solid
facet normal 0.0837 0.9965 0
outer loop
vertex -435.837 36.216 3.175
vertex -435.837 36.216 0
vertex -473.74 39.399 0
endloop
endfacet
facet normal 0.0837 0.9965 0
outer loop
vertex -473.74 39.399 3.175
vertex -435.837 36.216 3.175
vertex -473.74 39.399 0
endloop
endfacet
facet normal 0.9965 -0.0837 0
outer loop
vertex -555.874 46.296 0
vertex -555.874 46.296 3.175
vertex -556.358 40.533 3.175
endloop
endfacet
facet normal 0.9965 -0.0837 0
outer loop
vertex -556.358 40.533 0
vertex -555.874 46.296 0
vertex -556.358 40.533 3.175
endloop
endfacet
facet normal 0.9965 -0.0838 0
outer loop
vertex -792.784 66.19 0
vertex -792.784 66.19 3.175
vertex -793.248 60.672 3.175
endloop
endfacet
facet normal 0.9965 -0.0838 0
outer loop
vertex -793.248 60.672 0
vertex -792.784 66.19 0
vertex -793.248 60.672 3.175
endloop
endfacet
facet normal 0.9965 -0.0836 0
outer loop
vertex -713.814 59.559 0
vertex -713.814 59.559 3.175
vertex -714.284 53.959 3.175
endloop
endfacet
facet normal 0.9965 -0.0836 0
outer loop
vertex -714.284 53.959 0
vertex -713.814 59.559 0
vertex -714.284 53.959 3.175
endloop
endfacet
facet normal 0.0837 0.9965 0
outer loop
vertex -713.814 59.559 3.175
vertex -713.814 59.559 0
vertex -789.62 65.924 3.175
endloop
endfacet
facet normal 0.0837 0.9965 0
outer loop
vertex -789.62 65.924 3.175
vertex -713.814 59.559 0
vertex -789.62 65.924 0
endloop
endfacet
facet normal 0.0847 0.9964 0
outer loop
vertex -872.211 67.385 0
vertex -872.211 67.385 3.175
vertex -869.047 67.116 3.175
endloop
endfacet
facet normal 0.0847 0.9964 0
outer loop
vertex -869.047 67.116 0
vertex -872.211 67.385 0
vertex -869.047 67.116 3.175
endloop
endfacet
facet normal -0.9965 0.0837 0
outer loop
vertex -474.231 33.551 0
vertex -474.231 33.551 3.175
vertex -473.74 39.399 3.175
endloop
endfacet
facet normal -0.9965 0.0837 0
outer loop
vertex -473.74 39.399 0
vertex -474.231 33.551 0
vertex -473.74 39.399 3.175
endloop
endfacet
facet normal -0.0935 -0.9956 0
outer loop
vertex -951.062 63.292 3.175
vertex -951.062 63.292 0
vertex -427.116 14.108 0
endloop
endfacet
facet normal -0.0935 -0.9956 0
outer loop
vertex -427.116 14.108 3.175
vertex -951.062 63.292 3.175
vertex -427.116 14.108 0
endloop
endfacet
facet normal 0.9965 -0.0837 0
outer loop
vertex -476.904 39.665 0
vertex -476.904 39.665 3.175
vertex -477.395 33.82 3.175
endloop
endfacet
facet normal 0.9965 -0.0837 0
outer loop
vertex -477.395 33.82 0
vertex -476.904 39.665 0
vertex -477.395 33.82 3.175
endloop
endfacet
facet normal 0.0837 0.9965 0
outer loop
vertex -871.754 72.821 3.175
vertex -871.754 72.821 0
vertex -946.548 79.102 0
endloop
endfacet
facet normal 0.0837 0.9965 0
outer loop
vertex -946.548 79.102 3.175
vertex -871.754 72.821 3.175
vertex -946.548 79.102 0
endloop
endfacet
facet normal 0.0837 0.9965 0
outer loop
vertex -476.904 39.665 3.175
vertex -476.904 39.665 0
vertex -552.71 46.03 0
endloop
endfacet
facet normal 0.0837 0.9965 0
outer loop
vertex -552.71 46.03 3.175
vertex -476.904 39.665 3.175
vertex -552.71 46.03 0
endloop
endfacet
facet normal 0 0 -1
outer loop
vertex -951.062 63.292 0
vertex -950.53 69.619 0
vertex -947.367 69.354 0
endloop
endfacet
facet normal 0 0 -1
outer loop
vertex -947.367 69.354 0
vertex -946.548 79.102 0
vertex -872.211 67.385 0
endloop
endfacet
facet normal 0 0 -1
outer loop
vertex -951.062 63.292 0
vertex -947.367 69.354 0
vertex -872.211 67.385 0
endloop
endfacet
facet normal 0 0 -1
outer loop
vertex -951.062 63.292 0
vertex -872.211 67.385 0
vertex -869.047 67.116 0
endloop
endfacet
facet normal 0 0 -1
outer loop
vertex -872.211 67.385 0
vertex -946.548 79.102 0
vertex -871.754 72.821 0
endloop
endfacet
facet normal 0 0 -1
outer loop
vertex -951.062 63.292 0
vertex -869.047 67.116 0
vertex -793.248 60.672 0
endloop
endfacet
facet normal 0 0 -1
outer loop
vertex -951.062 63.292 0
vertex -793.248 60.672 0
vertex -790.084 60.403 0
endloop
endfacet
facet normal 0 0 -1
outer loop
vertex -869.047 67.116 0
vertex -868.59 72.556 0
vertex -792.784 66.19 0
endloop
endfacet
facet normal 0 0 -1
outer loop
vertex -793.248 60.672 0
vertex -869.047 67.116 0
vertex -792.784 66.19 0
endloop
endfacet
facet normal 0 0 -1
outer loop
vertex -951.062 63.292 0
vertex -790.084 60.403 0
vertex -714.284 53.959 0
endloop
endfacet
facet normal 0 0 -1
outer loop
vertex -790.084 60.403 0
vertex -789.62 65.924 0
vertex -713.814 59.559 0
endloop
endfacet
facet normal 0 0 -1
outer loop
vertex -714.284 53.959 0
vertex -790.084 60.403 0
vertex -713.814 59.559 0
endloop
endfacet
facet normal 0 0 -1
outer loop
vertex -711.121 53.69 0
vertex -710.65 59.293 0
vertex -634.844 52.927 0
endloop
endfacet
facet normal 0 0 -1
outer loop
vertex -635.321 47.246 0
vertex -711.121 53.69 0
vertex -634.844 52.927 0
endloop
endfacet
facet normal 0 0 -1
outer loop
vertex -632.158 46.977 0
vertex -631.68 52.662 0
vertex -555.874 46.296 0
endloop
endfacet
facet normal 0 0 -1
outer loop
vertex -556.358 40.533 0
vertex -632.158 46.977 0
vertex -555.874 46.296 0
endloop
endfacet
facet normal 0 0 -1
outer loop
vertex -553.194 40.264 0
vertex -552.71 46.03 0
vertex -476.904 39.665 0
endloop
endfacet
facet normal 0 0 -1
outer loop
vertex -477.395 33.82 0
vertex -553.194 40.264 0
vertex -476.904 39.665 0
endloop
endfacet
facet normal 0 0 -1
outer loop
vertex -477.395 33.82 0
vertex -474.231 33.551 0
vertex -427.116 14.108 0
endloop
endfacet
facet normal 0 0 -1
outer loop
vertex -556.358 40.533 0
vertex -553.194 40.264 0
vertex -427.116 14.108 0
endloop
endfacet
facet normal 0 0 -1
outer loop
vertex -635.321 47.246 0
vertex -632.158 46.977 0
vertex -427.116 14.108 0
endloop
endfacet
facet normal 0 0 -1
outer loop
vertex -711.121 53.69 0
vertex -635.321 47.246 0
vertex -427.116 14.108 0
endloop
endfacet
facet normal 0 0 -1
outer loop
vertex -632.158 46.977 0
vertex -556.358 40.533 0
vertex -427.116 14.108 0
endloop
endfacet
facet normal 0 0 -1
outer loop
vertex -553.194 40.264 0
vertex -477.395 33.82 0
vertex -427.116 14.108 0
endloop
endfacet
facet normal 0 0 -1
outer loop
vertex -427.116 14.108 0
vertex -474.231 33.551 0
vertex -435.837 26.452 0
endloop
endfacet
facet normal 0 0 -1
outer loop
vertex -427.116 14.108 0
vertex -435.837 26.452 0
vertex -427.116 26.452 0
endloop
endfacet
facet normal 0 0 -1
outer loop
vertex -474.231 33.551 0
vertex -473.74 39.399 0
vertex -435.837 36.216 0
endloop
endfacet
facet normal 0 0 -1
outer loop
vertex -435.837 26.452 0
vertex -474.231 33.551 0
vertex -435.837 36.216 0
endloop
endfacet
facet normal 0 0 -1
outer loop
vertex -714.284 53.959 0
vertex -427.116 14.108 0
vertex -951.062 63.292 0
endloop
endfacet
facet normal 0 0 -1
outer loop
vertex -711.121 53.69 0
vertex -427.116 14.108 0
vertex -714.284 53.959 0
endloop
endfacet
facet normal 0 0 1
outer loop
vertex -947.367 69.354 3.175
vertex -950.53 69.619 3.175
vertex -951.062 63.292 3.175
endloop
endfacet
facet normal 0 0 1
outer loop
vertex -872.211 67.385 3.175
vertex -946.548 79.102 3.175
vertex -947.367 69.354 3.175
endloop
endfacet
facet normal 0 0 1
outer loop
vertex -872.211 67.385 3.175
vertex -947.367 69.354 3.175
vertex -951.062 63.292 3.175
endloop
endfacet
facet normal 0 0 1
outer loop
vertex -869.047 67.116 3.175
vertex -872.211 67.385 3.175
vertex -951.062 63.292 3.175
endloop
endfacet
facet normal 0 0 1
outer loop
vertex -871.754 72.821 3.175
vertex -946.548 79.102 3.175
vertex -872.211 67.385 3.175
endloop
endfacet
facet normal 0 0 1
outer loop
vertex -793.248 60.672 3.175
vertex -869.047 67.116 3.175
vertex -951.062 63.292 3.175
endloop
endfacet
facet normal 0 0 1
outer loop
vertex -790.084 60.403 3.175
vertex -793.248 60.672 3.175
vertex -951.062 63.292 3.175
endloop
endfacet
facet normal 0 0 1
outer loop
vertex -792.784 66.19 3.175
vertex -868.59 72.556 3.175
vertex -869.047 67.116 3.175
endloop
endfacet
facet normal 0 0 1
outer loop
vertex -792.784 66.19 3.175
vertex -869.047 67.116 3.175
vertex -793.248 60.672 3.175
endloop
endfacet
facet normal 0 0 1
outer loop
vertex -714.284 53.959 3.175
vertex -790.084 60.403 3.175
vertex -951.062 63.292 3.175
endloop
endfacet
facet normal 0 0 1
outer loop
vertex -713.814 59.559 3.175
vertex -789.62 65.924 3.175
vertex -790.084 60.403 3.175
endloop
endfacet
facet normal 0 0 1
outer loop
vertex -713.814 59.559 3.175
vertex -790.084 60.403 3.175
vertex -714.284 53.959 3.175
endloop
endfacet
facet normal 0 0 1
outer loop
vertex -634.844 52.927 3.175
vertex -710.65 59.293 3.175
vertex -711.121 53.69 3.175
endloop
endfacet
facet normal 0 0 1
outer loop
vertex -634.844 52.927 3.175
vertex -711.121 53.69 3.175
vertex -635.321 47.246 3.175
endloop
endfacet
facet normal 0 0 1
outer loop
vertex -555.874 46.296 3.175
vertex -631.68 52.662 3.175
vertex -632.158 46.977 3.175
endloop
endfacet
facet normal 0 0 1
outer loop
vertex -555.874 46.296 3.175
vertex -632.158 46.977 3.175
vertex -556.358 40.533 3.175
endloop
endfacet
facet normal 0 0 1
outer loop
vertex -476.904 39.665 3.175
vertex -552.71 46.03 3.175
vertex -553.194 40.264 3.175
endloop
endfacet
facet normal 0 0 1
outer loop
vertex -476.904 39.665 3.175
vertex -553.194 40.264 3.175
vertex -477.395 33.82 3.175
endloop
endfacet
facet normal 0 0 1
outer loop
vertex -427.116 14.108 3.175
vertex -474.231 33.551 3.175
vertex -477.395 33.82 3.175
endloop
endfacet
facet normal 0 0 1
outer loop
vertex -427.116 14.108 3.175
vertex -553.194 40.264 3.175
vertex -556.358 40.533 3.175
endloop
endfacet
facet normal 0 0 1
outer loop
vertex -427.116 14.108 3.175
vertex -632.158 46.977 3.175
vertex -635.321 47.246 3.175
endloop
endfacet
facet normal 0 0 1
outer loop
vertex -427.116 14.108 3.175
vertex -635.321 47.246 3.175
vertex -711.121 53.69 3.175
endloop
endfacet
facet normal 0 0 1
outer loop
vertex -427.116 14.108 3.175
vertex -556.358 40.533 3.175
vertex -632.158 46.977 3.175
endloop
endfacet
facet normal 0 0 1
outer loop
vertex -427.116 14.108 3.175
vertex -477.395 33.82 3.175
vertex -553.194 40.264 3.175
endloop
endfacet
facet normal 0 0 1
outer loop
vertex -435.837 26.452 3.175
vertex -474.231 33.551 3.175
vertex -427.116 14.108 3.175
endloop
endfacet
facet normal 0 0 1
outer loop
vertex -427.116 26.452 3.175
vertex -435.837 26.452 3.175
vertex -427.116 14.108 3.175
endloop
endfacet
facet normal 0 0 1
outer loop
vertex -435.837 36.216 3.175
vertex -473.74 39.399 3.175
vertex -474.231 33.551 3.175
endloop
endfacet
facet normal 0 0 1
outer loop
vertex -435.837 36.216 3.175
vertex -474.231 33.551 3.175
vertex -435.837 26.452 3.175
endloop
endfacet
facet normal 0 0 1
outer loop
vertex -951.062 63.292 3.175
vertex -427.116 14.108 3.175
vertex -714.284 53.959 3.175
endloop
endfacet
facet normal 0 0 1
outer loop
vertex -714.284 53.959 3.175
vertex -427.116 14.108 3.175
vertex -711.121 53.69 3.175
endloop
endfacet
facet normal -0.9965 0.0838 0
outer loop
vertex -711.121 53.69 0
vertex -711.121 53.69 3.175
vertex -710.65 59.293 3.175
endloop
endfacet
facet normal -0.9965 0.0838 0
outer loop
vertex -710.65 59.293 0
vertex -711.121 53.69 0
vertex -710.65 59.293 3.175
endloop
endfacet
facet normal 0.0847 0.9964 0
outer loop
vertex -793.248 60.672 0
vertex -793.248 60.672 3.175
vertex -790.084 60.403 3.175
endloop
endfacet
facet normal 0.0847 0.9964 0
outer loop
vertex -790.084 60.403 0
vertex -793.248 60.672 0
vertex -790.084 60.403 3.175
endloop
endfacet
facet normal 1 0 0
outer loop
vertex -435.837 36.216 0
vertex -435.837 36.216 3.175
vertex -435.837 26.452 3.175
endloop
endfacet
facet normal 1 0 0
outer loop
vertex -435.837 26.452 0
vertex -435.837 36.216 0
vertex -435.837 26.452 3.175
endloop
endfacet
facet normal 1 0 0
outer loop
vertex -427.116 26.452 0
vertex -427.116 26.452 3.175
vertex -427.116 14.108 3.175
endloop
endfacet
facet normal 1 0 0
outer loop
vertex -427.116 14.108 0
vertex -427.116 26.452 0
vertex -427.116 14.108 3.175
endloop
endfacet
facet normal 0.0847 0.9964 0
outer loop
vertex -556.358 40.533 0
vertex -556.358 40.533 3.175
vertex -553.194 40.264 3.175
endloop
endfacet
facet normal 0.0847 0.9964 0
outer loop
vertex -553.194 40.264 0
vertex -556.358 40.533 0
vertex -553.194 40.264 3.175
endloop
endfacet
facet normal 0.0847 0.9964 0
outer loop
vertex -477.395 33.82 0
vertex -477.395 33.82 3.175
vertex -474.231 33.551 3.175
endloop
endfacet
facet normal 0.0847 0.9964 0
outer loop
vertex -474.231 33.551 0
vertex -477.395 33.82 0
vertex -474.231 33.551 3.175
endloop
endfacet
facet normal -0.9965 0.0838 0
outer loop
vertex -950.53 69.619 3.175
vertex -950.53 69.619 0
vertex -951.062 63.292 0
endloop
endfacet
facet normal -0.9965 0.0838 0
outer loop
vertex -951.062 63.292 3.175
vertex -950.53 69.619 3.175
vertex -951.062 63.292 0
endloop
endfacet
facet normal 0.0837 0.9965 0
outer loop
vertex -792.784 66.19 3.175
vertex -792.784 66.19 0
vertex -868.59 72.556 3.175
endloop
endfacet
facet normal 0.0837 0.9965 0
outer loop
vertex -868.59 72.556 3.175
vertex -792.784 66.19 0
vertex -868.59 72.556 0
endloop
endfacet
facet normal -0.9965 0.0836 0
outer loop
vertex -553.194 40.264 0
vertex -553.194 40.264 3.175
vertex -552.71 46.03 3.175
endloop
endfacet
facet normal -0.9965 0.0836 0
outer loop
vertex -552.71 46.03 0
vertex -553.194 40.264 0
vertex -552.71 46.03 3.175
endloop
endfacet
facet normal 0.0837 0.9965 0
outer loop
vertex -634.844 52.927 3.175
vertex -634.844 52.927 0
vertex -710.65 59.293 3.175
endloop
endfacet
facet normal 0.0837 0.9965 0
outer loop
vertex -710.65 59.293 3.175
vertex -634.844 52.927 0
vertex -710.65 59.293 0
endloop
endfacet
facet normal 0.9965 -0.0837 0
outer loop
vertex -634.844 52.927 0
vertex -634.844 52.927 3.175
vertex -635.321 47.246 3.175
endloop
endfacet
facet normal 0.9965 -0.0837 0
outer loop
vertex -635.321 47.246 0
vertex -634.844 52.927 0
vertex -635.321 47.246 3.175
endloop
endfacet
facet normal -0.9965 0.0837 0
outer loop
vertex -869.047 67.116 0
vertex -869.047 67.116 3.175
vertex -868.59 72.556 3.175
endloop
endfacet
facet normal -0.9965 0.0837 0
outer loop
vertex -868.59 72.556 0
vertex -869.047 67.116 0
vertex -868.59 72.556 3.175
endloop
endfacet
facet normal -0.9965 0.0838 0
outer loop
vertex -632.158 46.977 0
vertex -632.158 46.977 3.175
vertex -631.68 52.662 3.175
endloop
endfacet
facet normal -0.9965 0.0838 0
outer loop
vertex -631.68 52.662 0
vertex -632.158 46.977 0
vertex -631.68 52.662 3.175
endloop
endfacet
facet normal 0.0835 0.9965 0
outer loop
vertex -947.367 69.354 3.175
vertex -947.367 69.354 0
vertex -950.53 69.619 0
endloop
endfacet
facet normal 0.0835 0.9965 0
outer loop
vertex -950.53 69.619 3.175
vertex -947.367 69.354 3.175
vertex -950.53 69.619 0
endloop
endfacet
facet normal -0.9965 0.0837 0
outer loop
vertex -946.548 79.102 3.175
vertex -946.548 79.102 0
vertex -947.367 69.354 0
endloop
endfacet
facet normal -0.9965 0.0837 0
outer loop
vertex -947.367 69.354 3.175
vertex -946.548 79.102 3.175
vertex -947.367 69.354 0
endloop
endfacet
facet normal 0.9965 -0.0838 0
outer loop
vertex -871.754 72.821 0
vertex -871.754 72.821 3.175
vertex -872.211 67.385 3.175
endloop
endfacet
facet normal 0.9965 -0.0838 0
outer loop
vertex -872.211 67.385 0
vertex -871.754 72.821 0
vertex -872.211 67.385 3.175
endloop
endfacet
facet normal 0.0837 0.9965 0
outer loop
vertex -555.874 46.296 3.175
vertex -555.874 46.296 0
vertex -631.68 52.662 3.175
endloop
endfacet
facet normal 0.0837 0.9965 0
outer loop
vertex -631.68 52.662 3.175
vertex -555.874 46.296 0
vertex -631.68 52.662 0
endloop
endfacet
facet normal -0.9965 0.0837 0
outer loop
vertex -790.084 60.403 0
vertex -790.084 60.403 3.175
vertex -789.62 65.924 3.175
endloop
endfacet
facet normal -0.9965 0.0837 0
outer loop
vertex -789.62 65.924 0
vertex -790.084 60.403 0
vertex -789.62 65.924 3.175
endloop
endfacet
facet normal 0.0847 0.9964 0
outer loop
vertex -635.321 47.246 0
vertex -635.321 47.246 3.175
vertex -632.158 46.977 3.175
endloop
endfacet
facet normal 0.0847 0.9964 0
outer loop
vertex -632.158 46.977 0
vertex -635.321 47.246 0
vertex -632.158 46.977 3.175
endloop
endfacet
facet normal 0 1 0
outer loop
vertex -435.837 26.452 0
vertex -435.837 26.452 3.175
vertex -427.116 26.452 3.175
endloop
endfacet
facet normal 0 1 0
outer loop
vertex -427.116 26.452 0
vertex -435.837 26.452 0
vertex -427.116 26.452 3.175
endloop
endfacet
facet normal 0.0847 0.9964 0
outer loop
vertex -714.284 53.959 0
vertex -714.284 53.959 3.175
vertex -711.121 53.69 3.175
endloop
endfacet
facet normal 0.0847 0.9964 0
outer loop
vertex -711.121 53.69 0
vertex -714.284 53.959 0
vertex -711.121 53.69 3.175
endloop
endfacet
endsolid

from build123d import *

# Parameters (mm, degrees)
BOSS_EXTRUDE1_DEPTH = 3.175
CUT_EXTRUDE1_DEPTH  = 4.175
CUT_EXTRUDE2_DEPTH  = 7.62


with BuildPart() as part:
    # Sketch1 → Boss-Extrude1 (new body)
    with BuildSketch(Plane.XY):
        Polygon((-950.530495659, 69.619322302), (-951.061849964, 63.291592645), (-11.536706102, -24.902638492), (-8.372841274, -25.168315645), (0, -25.545856054), (152.4, -25.545856054), (152.4, -7.765856054), (139.7, -7.765856054), (139.7, -12.845856054), (136.525, -12.845856054), (136.525, -7.765856054), (95.25, -7.765856054), (95.25, -12.845856054), (92.075, -12.845856054), (92.075, -7.765856054), (79.375, -7.765856054), (79.375, -12.845856054), (76.2, -12.845856054), (76.2, -7.765856054), (69.85, -7.765856054), (25.4, -0.145856054), (19.05, -0.145856054), (19.05, -5.225856054), (15.875, -5.225856054), (15.875, -0.145856054), (3.175, -0.145856054), (3.175, -6.495856054), (0, -6.495856054), (0, -0.145856054), (-2.81225704, -0.145856054), (-6.247424053, 0.14260298), (-6.778778359, -6.185126677), (-9.942643187, -5.919449524), (-9.411288881, 0.408280132), (-946.54805097, 79.101852726), (-947.366630831, 69.353645149), align=None)
    extrude(amount=BOSS_EXTRUDE1_DEPTH)

    # Sketch2 → Cut-Extrude1 (cut, through all)
    with BuildSketch(Plane.XY.offset(3.175)):
        Polygon((-869.047169109, 67.116306724), (-868.590421605, 72.555567687), (-871.754286433, 72.821244839), (-872.210759203, 67.385255598), align=None)
        Polygon((-790.083960364, 60.403342827), (-789.620355495, 65.924265958), (-792.784220323, 66.189943111), (-793.247550458, 60.672291701), align=None)
        Polygon((-711.120751618, 53.69037893), (-710.650289385, 59.29296423), (-713.814154213, 59.558641383), (-714.284341712, 53.959327804), align=None)
        Polygon((-632.157542872, 46.977415032), (-631.680223276, 52.661662502), (-634.844088104, 52.927339654), (-635.321132966, 47.246363906), align=None)
        Polygon((-553.194334126, 40.264451135), (-552.710157166, 46.030360773), (-555.874021994, 46.296037926), (-556.35792422, 40.533400009), align=None)
        Polygon((-474.23112538, 33.551487238), (-473.740091056, 39.399059045), (-476.903955884, 39.664736197), (-477.394715474, 33.820436112), align=None)
        Polygon((-395.267916634, 26.83852334), (-394.770024946, 32.767757316), (-397.933889774, 33.033434469), (-398.431506728, 27.107472214), align=None)
        Polygon((-316.304707888, 20.125559443), (-315.799958836, 26.136455588), (-318.963823664, 26.402132741), (-319.468297982, 20.394508317), align=None)
        Polygon((-237.341499142, 13.412595546), (-236.829892727, 19.50515386), (-239.993757555, 19.770831012), (-240.505089236, 13.68154442), align=None)
        Polygon((-158.378290396, 6.699631648), (-157.859826617, 12.873852131), (-161.023691445, 13.139529284), (-161.54188049, 6.968580522), align=None)
        Polygon((-79.415081651, -0.013332249), (-78.889760507, 6.242550403), (-82.053625335, 6.508227555), (-82.578671745, 0.255616625), align=None)
    extrude(amount=-CUT_EXTRUDE1_DEPTH, mode=Mode.SUBTRACT)

    # Sketch3 → Cut-Extrude2 (cut)
    with BuildSketch(Plane.XY.offset(3.175)):
        Polygon((-435.836990415, 36.216246757), (-435.836990415, 26.451619727), (-427.115588921, 26.451619727), (-427.115588921, 14.108196169), (150.838987184, -84.054223576), (191.196568658, 26.451619727), align=None)
    extrude(amount=-CUT_EXTRUDE2_DEPTH, mode=Mode.SUBTRACT)


solid = part.part
